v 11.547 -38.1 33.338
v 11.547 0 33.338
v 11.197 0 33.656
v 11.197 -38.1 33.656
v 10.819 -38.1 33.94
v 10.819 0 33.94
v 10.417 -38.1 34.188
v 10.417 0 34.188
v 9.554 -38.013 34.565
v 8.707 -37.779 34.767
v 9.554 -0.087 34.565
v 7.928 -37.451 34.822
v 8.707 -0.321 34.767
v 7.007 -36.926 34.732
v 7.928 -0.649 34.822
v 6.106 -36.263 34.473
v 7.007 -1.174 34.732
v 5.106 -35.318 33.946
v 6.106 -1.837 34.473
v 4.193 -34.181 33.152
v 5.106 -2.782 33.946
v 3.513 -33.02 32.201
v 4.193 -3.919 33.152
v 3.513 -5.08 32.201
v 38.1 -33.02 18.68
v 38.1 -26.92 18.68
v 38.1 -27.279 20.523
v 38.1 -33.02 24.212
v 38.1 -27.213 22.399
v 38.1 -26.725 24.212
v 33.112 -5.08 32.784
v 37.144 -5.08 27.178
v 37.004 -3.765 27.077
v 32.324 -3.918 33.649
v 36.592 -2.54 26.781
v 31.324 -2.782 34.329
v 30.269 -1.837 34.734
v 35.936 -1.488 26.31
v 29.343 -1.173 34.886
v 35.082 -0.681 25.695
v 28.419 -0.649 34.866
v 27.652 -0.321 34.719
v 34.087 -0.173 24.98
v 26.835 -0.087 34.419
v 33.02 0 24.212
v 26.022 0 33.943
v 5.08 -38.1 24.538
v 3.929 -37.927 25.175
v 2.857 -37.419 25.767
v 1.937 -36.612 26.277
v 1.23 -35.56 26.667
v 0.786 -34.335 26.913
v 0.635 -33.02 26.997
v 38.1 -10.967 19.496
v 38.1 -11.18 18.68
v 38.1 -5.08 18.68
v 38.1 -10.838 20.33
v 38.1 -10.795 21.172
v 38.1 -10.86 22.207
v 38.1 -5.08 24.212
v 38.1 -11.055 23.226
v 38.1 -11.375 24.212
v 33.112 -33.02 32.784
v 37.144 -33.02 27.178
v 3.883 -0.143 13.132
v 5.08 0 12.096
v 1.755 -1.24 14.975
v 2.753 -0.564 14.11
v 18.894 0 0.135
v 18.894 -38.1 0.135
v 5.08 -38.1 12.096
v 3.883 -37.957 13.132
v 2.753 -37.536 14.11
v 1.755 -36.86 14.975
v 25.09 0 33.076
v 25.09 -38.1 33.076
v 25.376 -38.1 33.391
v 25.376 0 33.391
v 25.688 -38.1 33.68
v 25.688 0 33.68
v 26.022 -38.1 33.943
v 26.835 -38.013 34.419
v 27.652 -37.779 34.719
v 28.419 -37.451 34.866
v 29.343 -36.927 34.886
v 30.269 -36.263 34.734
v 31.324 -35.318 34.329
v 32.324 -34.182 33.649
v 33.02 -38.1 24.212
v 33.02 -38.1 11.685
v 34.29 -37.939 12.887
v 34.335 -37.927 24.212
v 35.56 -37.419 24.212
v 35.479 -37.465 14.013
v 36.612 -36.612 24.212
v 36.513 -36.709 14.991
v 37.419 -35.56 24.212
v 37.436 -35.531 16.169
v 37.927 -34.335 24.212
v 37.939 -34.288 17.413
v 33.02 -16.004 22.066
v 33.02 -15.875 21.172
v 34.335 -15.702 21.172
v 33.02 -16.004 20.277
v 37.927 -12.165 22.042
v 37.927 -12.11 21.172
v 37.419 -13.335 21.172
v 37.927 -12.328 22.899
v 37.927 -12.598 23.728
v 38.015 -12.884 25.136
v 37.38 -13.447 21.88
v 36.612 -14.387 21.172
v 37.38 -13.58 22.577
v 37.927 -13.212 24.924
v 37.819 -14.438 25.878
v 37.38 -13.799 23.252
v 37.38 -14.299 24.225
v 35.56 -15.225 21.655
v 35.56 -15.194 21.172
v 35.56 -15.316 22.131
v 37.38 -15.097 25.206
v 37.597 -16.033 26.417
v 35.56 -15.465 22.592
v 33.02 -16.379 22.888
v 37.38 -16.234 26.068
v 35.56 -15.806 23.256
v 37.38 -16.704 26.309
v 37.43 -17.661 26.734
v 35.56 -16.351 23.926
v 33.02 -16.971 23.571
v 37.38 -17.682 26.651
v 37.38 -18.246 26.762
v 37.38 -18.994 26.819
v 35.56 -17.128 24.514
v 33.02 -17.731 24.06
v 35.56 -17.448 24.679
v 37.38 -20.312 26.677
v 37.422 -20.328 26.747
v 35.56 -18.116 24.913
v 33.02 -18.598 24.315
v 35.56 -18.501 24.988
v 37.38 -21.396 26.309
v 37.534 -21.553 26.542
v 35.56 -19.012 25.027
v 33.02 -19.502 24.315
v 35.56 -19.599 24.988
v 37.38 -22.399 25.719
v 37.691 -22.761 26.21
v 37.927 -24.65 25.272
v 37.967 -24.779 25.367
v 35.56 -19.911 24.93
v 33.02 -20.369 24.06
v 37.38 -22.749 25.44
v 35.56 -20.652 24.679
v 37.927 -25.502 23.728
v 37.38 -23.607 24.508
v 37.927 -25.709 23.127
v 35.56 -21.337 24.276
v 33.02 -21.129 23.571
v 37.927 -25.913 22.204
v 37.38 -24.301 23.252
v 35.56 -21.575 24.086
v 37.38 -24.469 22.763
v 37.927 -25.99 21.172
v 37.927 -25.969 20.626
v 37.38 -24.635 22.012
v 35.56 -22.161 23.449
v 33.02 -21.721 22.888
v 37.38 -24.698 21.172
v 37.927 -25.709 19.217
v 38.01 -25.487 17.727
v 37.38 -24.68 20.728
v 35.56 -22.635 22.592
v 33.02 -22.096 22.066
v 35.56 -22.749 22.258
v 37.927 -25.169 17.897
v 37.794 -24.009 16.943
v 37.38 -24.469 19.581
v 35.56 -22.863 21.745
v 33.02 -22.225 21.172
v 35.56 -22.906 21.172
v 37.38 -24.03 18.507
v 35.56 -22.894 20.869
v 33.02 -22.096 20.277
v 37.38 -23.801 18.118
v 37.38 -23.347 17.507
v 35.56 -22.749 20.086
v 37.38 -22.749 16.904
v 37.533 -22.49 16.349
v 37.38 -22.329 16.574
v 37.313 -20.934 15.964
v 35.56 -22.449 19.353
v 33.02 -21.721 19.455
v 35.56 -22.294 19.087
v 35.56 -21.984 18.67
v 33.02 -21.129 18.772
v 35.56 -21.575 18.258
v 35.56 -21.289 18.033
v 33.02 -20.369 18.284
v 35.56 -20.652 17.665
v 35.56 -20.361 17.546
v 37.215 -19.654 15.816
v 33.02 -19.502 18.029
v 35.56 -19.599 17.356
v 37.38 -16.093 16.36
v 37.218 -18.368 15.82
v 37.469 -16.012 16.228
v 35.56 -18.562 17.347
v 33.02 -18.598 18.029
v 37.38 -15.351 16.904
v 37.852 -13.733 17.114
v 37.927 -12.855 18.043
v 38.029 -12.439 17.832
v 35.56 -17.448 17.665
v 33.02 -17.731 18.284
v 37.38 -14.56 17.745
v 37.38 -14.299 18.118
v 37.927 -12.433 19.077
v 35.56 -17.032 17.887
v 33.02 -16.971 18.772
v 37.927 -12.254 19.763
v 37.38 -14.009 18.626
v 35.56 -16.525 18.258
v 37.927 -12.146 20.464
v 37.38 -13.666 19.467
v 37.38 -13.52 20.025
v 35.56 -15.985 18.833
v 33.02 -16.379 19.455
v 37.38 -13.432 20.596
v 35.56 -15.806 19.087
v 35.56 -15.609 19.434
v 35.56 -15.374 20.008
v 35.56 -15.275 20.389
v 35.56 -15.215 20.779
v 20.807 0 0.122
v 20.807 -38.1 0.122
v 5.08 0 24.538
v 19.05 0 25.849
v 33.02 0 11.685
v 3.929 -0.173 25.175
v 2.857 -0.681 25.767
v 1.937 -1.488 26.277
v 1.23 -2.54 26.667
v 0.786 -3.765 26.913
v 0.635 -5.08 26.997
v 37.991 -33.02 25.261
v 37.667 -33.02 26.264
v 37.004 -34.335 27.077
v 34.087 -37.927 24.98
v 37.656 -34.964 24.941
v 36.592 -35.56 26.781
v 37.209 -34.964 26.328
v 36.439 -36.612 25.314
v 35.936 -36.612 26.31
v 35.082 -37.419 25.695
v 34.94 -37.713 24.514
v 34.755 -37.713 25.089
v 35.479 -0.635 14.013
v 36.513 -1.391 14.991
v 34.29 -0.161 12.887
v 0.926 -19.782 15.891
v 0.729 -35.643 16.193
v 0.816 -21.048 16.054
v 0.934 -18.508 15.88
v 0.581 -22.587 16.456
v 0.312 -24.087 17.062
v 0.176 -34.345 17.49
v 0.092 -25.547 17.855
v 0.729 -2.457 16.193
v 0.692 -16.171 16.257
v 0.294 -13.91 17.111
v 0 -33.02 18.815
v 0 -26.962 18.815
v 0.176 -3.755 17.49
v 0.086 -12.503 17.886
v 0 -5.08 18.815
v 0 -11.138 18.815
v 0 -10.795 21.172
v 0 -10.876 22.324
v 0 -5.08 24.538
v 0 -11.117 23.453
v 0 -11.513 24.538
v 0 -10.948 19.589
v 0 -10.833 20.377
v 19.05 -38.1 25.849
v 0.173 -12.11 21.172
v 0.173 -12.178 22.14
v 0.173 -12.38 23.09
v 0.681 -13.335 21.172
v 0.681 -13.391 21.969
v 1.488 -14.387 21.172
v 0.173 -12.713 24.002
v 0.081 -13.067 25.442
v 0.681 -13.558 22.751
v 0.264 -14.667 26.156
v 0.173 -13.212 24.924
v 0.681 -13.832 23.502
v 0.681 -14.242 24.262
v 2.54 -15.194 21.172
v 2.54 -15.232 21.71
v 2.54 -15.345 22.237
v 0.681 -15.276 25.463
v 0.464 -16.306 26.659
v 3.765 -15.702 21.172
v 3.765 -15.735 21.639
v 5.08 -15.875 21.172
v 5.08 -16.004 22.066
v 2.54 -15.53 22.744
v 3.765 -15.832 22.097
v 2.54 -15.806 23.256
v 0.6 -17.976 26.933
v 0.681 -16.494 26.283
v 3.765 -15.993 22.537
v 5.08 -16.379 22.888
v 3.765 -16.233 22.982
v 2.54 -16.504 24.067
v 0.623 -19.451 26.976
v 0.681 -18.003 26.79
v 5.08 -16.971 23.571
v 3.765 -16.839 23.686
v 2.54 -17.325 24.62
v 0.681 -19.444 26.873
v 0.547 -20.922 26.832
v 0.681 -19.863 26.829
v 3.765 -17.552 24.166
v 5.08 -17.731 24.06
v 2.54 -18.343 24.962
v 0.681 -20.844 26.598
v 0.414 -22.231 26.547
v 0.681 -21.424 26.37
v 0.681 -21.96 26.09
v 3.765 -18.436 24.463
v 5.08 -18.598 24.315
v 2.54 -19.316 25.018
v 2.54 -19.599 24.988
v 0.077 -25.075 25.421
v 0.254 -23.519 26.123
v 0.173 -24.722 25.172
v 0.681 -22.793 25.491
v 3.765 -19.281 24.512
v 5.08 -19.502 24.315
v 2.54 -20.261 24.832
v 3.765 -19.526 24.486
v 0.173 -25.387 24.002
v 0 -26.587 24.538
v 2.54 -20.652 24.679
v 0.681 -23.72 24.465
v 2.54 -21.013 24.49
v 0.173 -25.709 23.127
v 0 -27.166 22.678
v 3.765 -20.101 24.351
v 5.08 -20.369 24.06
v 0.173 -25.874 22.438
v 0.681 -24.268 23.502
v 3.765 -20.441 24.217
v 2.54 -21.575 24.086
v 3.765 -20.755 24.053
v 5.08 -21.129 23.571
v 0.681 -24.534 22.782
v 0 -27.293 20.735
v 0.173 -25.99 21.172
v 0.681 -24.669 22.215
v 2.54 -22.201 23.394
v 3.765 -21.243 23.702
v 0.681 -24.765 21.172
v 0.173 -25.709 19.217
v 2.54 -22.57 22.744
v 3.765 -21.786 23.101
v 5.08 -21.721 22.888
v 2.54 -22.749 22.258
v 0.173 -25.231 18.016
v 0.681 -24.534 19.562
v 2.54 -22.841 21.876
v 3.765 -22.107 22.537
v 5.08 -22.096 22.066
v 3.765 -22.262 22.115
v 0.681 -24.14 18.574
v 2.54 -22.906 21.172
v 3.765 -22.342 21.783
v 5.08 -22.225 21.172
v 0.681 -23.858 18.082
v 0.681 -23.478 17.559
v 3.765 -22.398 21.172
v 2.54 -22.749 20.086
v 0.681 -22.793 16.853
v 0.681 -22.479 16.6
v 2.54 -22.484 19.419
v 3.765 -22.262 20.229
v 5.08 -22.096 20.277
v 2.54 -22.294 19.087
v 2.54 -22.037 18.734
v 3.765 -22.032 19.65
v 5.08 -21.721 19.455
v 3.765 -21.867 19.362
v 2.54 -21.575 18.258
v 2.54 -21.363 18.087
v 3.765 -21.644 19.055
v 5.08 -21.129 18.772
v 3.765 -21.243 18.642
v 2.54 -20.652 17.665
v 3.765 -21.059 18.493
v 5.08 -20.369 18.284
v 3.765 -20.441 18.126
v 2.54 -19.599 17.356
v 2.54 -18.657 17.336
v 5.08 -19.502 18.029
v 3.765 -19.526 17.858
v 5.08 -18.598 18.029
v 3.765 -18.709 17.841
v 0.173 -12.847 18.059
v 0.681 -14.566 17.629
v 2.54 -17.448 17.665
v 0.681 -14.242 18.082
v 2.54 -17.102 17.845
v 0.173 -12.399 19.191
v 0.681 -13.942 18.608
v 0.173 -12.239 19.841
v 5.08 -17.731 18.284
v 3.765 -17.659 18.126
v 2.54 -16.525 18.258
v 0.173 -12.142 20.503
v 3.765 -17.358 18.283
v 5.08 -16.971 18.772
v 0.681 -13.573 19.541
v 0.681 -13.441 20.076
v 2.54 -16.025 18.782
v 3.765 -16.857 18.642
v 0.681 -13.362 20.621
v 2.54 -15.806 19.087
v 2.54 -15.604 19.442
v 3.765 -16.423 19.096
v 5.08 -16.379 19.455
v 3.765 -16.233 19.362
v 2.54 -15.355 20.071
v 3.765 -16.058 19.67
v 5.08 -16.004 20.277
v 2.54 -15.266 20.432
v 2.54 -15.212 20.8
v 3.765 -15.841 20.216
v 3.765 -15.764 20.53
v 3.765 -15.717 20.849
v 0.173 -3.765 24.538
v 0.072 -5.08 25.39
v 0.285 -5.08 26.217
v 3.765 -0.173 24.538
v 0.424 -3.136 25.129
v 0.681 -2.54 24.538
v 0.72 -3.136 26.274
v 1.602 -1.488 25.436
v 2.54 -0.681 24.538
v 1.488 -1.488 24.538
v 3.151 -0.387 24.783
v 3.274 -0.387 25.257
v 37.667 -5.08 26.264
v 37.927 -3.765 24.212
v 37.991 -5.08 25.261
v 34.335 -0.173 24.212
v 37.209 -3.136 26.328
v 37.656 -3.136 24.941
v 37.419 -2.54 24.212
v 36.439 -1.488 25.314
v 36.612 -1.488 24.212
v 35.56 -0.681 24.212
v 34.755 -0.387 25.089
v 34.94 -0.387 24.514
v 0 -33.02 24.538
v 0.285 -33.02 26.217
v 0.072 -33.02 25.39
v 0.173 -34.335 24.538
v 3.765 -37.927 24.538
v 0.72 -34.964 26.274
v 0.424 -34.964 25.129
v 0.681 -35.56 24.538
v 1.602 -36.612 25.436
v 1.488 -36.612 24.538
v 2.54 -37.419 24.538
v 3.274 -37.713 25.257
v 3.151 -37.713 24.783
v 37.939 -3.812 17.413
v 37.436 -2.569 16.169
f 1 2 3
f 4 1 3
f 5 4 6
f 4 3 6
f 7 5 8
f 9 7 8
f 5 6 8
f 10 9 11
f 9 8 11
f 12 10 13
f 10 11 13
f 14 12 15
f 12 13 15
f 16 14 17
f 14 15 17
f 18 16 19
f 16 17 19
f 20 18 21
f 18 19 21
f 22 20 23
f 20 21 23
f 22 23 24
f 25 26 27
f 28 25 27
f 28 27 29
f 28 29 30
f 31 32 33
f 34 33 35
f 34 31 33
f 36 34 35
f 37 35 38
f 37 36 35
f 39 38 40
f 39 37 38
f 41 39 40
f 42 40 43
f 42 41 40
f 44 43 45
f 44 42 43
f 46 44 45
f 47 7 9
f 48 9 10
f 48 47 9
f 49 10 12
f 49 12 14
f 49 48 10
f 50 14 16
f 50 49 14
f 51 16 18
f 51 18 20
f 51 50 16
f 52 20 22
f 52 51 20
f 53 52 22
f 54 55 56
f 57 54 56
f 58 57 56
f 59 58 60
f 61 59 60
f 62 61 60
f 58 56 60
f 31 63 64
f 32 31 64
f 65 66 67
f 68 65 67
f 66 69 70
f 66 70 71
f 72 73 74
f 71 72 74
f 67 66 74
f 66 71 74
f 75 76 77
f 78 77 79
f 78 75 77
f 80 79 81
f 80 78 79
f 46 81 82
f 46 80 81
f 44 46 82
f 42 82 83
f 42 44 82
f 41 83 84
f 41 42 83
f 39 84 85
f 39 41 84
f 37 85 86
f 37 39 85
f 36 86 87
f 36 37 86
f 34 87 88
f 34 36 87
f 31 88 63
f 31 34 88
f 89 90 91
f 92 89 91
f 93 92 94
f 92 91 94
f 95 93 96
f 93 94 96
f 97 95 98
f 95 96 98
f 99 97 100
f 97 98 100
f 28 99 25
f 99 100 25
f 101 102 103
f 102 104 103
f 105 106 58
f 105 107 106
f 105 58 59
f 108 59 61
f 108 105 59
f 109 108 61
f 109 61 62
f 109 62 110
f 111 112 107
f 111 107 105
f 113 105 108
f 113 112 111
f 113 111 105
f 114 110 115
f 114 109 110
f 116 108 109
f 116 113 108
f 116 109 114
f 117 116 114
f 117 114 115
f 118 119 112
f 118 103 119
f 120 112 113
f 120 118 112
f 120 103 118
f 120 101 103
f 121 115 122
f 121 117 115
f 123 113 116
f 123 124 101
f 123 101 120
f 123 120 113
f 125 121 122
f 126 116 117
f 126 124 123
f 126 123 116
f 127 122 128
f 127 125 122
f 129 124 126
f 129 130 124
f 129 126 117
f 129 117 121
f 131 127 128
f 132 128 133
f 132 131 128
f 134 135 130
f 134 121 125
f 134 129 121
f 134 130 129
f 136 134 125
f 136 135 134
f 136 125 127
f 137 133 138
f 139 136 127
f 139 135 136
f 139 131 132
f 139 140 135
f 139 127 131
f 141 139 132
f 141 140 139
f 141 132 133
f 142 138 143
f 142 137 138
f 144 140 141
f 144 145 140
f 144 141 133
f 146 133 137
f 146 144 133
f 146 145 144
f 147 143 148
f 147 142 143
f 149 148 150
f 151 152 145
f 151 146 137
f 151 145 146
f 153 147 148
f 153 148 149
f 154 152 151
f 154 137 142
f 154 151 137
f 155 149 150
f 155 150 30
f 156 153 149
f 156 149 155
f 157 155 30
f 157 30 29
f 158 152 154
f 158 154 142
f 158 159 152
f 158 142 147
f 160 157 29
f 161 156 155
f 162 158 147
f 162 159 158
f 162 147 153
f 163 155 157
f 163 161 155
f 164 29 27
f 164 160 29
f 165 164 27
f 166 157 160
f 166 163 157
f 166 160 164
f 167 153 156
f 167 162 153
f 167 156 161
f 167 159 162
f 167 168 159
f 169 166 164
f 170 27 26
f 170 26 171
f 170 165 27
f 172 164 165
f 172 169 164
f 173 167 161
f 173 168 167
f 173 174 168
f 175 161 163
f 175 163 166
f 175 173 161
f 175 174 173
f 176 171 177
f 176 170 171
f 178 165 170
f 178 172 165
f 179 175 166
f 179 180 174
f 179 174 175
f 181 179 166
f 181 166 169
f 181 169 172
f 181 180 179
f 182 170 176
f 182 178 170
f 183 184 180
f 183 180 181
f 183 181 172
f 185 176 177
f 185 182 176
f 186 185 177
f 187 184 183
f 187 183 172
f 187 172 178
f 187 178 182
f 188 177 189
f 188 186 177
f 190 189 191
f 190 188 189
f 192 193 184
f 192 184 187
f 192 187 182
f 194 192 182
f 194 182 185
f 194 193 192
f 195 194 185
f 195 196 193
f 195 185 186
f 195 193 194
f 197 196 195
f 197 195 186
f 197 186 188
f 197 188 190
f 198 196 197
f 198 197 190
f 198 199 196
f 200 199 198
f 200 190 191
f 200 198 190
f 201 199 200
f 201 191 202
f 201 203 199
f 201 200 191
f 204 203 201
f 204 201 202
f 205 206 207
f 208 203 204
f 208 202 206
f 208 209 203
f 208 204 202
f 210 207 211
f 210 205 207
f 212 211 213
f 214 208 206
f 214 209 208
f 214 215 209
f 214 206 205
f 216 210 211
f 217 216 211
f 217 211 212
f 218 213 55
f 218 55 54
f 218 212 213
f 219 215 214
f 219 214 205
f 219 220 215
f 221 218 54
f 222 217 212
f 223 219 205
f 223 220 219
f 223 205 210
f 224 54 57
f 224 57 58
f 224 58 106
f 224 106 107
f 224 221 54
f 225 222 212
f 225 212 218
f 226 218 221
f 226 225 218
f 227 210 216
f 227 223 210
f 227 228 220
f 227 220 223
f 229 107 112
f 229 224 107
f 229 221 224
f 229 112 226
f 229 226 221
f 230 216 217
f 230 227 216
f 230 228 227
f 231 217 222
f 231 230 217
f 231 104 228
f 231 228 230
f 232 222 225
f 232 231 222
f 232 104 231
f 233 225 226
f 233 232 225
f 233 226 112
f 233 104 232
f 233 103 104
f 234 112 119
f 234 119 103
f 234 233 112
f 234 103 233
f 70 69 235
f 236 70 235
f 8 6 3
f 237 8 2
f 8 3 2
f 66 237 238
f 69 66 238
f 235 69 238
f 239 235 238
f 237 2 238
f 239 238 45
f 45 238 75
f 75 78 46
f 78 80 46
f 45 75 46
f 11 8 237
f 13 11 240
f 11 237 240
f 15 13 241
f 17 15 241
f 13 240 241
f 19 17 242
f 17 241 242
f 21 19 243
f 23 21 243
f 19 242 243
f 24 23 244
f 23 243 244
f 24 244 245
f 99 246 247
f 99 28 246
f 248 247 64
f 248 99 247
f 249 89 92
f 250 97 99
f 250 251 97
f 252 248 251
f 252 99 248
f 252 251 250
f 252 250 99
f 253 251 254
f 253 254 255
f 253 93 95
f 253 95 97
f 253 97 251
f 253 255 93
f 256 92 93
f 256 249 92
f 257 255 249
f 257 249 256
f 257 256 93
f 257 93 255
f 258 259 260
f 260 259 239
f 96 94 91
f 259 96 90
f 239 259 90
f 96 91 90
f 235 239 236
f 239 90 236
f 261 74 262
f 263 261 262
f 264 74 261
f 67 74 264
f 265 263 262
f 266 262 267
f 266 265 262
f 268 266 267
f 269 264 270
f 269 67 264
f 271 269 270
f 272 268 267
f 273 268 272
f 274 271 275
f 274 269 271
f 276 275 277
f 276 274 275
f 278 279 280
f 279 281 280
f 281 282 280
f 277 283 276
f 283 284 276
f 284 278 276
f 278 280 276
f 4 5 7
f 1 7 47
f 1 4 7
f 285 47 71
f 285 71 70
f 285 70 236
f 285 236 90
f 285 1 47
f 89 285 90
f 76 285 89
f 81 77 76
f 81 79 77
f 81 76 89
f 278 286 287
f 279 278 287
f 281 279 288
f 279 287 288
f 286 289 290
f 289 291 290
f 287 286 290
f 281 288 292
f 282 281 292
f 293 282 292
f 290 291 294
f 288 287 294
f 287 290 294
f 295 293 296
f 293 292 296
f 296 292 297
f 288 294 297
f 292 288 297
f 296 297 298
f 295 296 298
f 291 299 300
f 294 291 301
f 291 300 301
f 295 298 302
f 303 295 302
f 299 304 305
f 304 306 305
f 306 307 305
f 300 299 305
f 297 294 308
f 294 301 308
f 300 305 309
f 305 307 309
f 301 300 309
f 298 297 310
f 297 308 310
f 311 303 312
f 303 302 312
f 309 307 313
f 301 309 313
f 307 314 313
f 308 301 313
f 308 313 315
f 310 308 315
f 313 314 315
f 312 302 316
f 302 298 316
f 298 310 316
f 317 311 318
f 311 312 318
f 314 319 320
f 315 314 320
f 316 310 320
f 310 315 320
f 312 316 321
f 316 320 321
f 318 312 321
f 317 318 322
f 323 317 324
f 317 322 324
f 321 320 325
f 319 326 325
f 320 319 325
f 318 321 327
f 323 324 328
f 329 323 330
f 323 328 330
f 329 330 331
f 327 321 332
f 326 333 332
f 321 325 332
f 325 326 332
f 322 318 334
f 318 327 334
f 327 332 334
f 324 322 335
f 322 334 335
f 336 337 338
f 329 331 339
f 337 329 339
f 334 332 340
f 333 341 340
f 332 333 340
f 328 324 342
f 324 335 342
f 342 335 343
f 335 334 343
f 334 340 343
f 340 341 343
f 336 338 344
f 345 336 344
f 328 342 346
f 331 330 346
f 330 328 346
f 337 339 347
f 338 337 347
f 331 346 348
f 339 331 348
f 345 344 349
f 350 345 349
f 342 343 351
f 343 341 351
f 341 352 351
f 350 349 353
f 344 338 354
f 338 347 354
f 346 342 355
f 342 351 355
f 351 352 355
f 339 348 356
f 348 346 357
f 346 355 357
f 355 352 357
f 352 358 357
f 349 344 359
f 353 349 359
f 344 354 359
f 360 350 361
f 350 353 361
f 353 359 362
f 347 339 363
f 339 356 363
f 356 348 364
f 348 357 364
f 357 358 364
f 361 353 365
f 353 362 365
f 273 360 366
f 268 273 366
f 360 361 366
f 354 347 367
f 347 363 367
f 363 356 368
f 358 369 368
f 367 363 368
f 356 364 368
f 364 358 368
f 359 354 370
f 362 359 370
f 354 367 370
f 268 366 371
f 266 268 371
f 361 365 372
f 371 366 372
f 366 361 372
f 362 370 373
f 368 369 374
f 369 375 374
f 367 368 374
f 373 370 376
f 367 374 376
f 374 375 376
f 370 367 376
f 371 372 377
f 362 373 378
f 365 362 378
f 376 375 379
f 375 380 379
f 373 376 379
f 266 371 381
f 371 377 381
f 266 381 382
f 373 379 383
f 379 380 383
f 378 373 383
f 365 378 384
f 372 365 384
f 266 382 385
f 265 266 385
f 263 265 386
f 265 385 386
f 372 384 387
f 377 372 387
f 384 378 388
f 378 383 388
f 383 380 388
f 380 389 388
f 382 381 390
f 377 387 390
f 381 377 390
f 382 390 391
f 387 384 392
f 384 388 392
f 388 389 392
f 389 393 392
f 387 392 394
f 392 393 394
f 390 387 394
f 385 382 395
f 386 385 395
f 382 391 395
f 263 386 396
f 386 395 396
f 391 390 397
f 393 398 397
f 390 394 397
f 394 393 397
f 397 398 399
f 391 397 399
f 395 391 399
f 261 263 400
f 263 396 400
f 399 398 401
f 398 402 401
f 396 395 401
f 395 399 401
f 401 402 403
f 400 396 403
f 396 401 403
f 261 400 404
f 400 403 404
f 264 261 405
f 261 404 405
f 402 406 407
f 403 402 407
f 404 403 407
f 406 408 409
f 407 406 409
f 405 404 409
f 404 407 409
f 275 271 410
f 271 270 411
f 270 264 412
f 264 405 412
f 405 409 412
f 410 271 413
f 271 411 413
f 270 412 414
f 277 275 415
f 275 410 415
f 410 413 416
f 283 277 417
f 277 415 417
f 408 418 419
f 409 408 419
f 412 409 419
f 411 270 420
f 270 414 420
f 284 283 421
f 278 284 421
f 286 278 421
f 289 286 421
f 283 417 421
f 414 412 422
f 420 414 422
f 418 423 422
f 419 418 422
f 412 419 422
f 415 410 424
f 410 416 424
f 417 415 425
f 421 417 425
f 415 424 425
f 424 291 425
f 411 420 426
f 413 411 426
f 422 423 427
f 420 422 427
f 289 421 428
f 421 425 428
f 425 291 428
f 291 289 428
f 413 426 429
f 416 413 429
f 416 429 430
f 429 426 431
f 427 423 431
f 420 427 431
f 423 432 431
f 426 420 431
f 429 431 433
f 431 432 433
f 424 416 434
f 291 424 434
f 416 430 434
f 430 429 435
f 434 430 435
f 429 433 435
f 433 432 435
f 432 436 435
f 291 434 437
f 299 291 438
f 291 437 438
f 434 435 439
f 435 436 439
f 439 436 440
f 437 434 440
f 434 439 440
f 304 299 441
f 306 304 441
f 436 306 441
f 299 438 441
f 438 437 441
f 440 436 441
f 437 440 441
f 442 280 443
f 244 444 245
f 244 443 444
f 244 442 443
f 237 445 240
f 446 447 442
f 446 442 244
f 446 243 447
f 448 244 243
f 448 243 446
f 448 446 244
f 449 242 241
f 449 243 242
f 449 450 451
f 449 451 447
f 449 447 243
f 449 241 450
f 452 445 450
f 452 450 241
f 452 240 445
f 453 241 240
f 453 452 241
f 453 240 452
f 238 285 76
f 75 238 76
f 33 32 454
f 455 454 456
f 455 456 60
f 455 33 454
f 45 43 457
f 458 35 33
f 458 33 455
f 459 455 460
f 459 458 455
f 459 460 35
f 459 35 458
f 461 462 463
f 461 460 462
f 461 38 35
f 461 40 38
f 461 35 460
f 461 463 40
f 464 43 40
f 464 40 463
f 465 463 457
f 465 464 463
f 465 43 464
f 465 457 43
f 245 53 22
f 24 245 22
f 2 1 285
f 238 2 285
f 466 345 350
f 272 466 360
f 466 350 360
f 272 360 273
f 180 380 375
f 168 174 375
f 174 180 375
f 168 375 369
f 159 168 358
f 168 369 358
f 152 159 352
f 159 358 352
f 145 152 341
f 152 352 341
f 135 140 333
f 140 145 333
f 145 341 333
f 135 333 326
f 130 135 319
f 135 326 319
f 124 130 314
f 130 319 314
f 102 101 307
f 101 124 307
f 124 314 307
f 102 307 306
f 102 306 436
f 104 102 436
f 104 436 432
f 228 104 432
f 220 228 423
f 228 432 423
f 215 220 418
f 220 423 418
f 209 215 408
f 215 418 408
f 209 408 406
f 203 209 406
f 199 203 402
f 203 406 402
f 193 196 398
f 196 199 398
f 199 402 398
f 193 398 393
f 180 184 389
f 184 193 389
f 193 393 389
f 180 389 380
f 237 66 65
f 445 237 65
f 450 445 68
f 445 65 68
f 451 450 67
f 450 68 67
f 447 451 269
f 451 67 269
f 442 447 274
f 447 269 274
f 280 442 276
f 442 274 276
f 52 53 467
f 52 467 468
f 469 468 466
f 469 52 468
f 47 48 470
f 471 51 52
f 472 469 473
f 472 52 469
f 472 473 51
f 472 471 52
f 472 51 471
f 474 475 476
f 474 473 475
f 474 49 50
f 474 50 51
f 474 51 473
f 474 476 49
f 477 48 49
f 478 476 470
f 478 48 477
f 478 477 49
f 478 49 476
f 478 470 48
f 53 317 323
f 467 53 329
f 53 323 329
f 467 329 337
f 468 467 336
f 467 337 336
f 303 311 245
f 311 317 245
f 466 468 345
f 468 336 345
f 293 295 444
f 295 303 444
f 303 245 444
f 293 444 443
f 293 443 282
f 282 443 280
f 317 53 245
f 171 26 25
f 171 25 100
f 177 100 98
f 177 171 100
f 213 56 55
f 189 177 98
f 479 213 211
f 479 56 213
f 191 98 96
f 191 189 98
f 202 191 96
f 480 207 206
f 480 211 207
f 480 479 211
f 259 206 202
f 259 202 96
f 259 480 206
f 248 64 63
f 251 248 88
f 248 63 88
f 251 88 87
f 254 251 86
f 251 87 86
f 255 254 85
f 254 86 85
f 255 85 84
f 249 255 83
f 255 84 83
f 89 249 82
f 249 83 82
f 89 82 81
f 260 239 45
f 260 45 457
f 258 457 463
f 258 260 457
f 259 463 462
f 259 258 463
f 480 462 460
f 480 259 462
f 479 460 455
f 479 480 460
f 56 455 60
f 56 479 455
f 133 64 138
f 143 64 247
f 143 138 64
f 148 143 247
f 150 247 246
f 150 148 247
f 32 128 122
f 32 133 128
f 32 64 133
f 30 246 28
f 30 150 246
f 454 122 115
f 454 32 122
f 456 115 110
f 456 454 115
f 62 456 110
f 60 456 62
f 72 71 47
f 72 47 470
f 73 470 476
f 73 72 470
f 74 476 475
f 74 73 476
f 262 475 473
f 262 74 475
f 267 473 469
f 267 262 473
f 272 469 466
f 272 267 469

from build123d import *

# Parameters (mm, degrees)
F1_DEPTH     = 38.1
F3_DEPTH     = 38.1
F5_D         = 6.35
F6_T1_DEPTH  = 20.7437886812
F6_T3_DEPTH  = 27.94
F6_T5_DEPTH  = 49.7055689591
F6_T7_DEPTH  = 20.4179452734
F6_T9_DEPTH  = 49.0300859467
F6_T11_DEPTH = 71.8058781858
F6_T13_DEPTH = 25.3882661408
F6_T15_DEPTH = 70.8375780274
F6_T17_DEPTH = 26.1528668654
F6_T22_DEPTH = 5.08
F6_T28_DEPTH = 5.08
F6_T34_DEPTH = 5.08
F6_T40_DEPTH = 5.08


# Not quite as in the source:
# - a fillet or chamfer that OpenCascade refuses, or shapes differently, is made with other operations: its cross-section is extruded or revolved along the edge and cut away or added


with BuildPart() as f1:
    # F0 (on Front) → F1 (new body)
    with BuildSketch(Plane.XZ):
        Polygon((0, 38.1), (0, 0.2683098665), (38.1, 0), (38.1, 38.1), align=None)
    extrude(amount=F1_DEPTH)

    # F2 (on face) → F3 (cut)
    with BuildSketch(Plane.XZ.offset(38.1)):
        Polygon((29.289287496, 38.1), (6.7755630988, 38.1), (19.05, 25.849385187), align=None)
        Polygon((0, 38.1), (0, 25.849385187), (6.7755630988, 38.1), align=None)
        Polygon((29.289287496, 38.1), (38.1, 25.849385187), (38.1, 38.1), align=None)
        Polygon((0, 0.2683098665), (18.8937886297, 0.1352550134), (0, 16.4943691343), align=None)
        Polygon((38.1, 16.4943691343), (20.8069253196, 0.1217822194), (38.1, 0), align=None)
    extrude(amount=-F3_DEPTH, mode=Mode.SUBTRACT)

    # F5 (through all)
    with Locations(Plane.YZ.offset(38.1)):
        with Locations((-19.05, 21.1718771607)):
            Hole(F5_D / 2)

    # F6: fillet of radius 5.08 on 16 edges, made by hand

    # F6_s2 → F6_t1 (cut)
    with BuildSketch(Plane.XY.offset(3.7943691343)):
        with BuildLine():
            ThreePointArc((5.08, 0), (1.4878975516, -1.4878975516), (0, -5.08))
            Line((0, -5.08), (0, 0))
            Line((0, 0), (5.08, 0))
        make_face()
        with BuildLine():
            ThreePointArc((5.08, -38.1), (1.4878975516, -36.6121024484), (0, -33.02))
            Line((0, -33.02), (0, -38.1))
            Line((0, -38.1), (5.08, -38.1))
        make_face()
    extrude(amount=F6_T1_DEPTH, mode=Mode.SUBTRACT)

    # F6_s4 → F6_t3 (cut)
    with BuildSketch(Plane.XZ.offset(5.08)):
        with BuildLine():
            ThreePointArc((0.634616087, 26.9968082311), (0.1612120254, 25.8077738444), (0, 24.5381578155))
            Line((0, 24.5381578155), (0, 25.849385187))
            Line((0, 25.849385187), (0.634616087, 26.9968082311))
        make_face()
        with BuildLine():
            ThreePointArc((37.1441471446, 27.1784247107), (37.8551353391, 25.7704755844), (38.1, 24.2123144077))
            Line((38.1, 24.2123144077), (38.1, 25.849385187))
            Line((38.1, 25.849385187), (37.1441471446, 27.1784247107))
        make_face()
    extrude(amount=F6_T3_DEPTH, mode=Mode.SUBTRACT)

    # F6_s6 → F6_t5 (cut)
    with BuildSketch(Plane.XZ.offset(-5.8027844796)):
        with BuildLine():
            ThreePointArc((1.754752754, 14.9750232202), (0.4594666969, 16.704305057), (0, 18.8154829261))
            Line((0, 18.8154829261), (0, 16.4943691343))
            Line((0, 16.4943691343), (1.754752754, 14.9750232202))
        make_face()
    extrude(amount=F6_T5_DEPTH, mode=Mode.SUBTRACT)

    # F6_s8 → F6_t7 (cut)
    with BuildSketch(Plane.XY.offset(3.7943691343)):
        with BuildLine():
            ThreePointArc((33.02, 0), (36.6121024484, -1.4878975516), (38.1, -5.08))
            Line((38.1, -5.08), (38.1, 0))
            Line((38.1, 0), (33.02, 0))
        make_face()
        with BuildLine():
            ThreePointArc((33.02, -38.1), (36.6121024484, -36.6121024484), (38.1, -33.02))
            Line((38.1, -33.02), (38.1, -38.1))
            Line((38.1, -38.1), (33.02, -38.1))
        make_face()
    extrude(amount=F6_T7_DEPTH, mode=Mode.SUBTRACT)

    # F6_s10 → F6_t9 (cut)
    with BuildSketch(Plane.XZ.offset(-5.4650429733)):
        with BuildLine():
            ThreePointArc((38.1, 18.6803863236), (37.6863002203, 16.6723917386), (36.5125817899, 14.991447121))
            Line((36.5125817899, 14.991447121), (38.1, 16.4943691343))
            Line((38.1, 16.4943691343), (38.1, 18.6803863236))
        make_face()
    extrude(amount=F6_T9_DEPTH, mode=Mode.SUBTRACT)

    # F6_s12 → F6_t11 (cut)
    with BuildSketch(Plane.XZ.offset(-16.8529390929)):
        with BuildLine():
            ThreePointArc((11.5469219559, 33.3379013421), (7.2465010014, 34.7721948924), (3.5129264291, 32.2009618637))
            Line((3.5129264291, 32.2009618637), (6.7755630988, 38.1))
            Line((6.7755630988, 38.1), (11.5469219559, 33.3379013421))
        make_face()
    extrude(amount=F6_T11_DEPTH, mode=Mode.SUBTRACT)

    # F6_s14 → F6_t13 (cut)
    with BuildSketch(Plane(origin=(11.5824663758, 0, 20.9417773971), x_dir=(0, 1, 0), z_dir=(0.4839863023, 0, 0.8750755734))):
        with BuildLine():
            ThreePointArc((-38.1, 7.4307483528), (-36.6121024484, 11.0228508012), (-33.02, 12.5107483528))
            Line((-33.02, 12.5107483528), (-38.1, 12.5107483528))
            Line((-38.1, 12.5107483528), (-38.1, 7.4307483528))
        make_face()
        with BuildLine():
            ThreePointArc((0, 7.4307483528), (-1.4878975516, 11.0228508012), (-5.08, 12.5107483528))
            Line((-5.08, 12.5107483528), (0, 12.5107483528))
            Line((0, 12.5107483528), (0, 7.4307483528))
        make_face()
    extrude(amount=F6_T13_DEPTH, mode=Mode.SUBTRACT)

    # F6_s16 → F6_t15 (cut)
    with BuildSketch(Plane.XZ.offset(-16.3687890137)):
        with BuildLine():
            ThreePointArc((25.0903071925, 33.076204123), (29.1727291737, 34.8949986115), (33.1122507828, 32.7844650022))
            Line((33.1122507828, 32.7844650022), (29.289287496, 38.1))
            Line((29.289287496, 38.1), (25.0903071925, 33.076204123))
        make_face()
    extrude(amount=F6_T15_DEPTH, mode=Mode.SUBTRACT)

    # F6_s18 → F6_t17 (cut)
    with BuildSketch(Plane(origin=(-15.4901461094, 0, 21.5378510306), x_dir=(0, 1, 0), z_dir=(0.5838799809, 0, -0.8118399891))):
        with BuildLine():
            ThreePointArc((-33.02, 46.024042114), (-36.6121024484, 44.5361445625), (-38.1, 40.944042114))
            Line((-38.1, 40.944042114), (-38.1, 46.024042114))
            Line((-38.1, 46.024042114), (-33.02, 46.024042114))
        make_face()
        with BuildLine():
            ThreePointArc((-5.08, 46.024042114), (-1.4878975516, 44.5361445625), (0, 40.944042114))
            Line((0, 40.944042114), (0, 46.024042114))
            Line((0, 46.024042114), (-5.08, 46.024042114))
        make_face()
    extrude(amount=F6_T17_DEPTH, mode=Mode.SUBTRACT)


with BuildPart() as f6_tool20:
    # F6_s21 → F6_t22 (new body)
    with BuildSketch(Plane.XZ.offset(5.08)):
        Polygon((5.08, 24.5381578155), (0.634616087, 26.9968082311), (0, 25.849385187), (0, 24.5381578155), align=None)
    extrude(amount=-F6_T22_DEPTH)

    # F6_s23 → F6_t24 (revolve, cut)
    with BuildSketch(Plane(origin=(5.08, -5.08, 24.5381578155), x_dir=(0.9682653493, 0, -0.2499244151), z_dir=(0.2499244151, 0, 0.9682653493))):
        with BuildLine():
            ThreePointArc((0, -5.08), (5.08, 0), (0, 5.08))
            Line((0, 5.08), (0, -5.08))
        make_face()
    revolve(axis=Axis((5.08, -5.08, 24.5381578155), (0, 1, 0)), mode=Mode.SUBTRACT)


with BuildPart() as f1_1:
    add(f1.part)

    # F6_t19: cut F6_tool20
    add(f6_tool20.part, mode=Mode.SUBTRACT)


with BuildPart() as f6_tool26:
    # F6_s27 → F6_t28 (new body)
    with BuildSketch(Plane.XZ.offset(33.02)):
        Polygon((5.08, 24.5381578155), (0.634616087, 26.9968082311), (0, 25.849385187), (0, 24.5381578155), align=None)
    extrude(amount=F6_T28_DEPTH)

    # F6_s29 → F6_t30 (revolve, cut)
    with BuildSketch(Plane(origin=(5.08, -33.02, 24.5381578155), x_dir=(0.9682653493, 0, -0.2499244151), z_dir=(-0.2499244151, 0, -0.9682653493))):
        with BuildLine():
            ThreePointArc((0, -5.08), (5.08, 0), (0, 5.08))
            Line((0, 5.08), (0, -5.08))
        make_face()
    revolve(axis=Axis((5.08, -33.02, 24.5381578155), (0, -1, 0)), mode=Mode.SUBTRACT)


with BuildPart() as f1_2:
    add(f1_1.part)

    # F6_t25: cut F6_tool26
    add(f6_tool26.part, mode=Mode.SUBTRACT)


with BuildPart() as f6_tool32:
    # F6_s33 → F6_t34 (new body)
    with BuildSketch(Plane.XZ.offset(5.08)):
        Polygon((33.02, 24.2123144077), (38.1, 24.2123144077), (38.1, 25.849385187), (37.1441471446, 27.1784247107), align=None)
    extrude(amount=-F6_T34_DEPTH)

    # F6_s35 → F6_t36 (revolve, cut)
    with BuildSketch(Plane(origin=(33.02, -5.08, 24.2123144077), x_dir=(-0.9517982951, 0, -0.3067246411), z_dir=(0.3067246411, 0, -0.9517982951))):
        with BuildLine():
            ThreePointArc((0, -5.08), (5.08, 0), (0, 5.08))
            Line((0, 5.08), (0, -5.08))
        make_face()
    revolve(axis=Axis((33.02, -5.08, 24.2123144077), (0, 1, 0)), mode=Mode.SUBTRACT)


with BuildPart() as f1_3:
    add(f1_2.part)

    # F6_t31: cut F6_tool32
    add(f6_tool32.part, mode=Mode.SUBTRACT)


with BuildPart() as f6_tool38:
    # F6_s39 → F6_t40 (new body)
    with BuildSketch(Plane.XZ.offset(33.02)):
        Polygon((33.02, 24.2123144077), (38.1, 24.2123144077), (38.1, 25.849385187), (37.1441471446, 27.1784247107), align=None)
    extrude(amount=F6_T40_DEPTH)

    # F6_s41 → F6_t42 (revolve, cut)
    with BuildSketch(Plane(origin=(33.02, -33.02, 24.2123144077), x_dir=(-0.9517982951, 0, -0.3067246411), z_dir=(-0.3067246411, 0, 0.9517982951))):
        with BuildLine():
            ThreePointArc((0, -5.08), (5.08, 0), (0, 5.08))
            Line((0, 5.08), (0, -5.08))
        make_face()
    revolve(axis=Axis((33.02, -33.02, 24.2123144077), (0, -1, 0)), mode=Mode.SUBTRACT)


with BuildPart() as f1_4:
    add(f1_3.part)

    # F6_t37: cut F6_tool38
    add(f6_tool38.part, mode=Mode.SUBTRACT)

    # F6_s43 → F6_t44 (revolve, cut)
    with BuildSketch(Plane.XY.offset(21.1718771607)):
        with BuildLine():
            ThreePointArc((0, -10.795), (1.4878975516, -14.3871024484), (5.08, -15.875))
            Line((5.08, -15.875), (0, -15.875))
            Line((0, -15.875), (0, -10.795))
        make_face()
    revolve(axis=Axis((0, -19.05, 21.1718771607), (1, 0, 0)), mode=Mode.SUBTRACT)

    # F6_s45 → F6_t46 (revolve, cut)
    with BuildSketch(Plane.XY.offset(21.1718771607)):
        with BuildLine():
            ThreePointArc((38.1, -10.795), (36.6121024484, -14.3871024484), (33.02, -15.875))
            Line((33.02, -15.875), (38.1, -15.875))
            Line((38.1, -15.875), (38.1, -10.795))
        make_face()
    revolve(axis=Axis((38.1, -19.05, 21.1718771607), (1, 0, 0)), mode=Mode.SUBTRACT)


solid = f1_4.part
